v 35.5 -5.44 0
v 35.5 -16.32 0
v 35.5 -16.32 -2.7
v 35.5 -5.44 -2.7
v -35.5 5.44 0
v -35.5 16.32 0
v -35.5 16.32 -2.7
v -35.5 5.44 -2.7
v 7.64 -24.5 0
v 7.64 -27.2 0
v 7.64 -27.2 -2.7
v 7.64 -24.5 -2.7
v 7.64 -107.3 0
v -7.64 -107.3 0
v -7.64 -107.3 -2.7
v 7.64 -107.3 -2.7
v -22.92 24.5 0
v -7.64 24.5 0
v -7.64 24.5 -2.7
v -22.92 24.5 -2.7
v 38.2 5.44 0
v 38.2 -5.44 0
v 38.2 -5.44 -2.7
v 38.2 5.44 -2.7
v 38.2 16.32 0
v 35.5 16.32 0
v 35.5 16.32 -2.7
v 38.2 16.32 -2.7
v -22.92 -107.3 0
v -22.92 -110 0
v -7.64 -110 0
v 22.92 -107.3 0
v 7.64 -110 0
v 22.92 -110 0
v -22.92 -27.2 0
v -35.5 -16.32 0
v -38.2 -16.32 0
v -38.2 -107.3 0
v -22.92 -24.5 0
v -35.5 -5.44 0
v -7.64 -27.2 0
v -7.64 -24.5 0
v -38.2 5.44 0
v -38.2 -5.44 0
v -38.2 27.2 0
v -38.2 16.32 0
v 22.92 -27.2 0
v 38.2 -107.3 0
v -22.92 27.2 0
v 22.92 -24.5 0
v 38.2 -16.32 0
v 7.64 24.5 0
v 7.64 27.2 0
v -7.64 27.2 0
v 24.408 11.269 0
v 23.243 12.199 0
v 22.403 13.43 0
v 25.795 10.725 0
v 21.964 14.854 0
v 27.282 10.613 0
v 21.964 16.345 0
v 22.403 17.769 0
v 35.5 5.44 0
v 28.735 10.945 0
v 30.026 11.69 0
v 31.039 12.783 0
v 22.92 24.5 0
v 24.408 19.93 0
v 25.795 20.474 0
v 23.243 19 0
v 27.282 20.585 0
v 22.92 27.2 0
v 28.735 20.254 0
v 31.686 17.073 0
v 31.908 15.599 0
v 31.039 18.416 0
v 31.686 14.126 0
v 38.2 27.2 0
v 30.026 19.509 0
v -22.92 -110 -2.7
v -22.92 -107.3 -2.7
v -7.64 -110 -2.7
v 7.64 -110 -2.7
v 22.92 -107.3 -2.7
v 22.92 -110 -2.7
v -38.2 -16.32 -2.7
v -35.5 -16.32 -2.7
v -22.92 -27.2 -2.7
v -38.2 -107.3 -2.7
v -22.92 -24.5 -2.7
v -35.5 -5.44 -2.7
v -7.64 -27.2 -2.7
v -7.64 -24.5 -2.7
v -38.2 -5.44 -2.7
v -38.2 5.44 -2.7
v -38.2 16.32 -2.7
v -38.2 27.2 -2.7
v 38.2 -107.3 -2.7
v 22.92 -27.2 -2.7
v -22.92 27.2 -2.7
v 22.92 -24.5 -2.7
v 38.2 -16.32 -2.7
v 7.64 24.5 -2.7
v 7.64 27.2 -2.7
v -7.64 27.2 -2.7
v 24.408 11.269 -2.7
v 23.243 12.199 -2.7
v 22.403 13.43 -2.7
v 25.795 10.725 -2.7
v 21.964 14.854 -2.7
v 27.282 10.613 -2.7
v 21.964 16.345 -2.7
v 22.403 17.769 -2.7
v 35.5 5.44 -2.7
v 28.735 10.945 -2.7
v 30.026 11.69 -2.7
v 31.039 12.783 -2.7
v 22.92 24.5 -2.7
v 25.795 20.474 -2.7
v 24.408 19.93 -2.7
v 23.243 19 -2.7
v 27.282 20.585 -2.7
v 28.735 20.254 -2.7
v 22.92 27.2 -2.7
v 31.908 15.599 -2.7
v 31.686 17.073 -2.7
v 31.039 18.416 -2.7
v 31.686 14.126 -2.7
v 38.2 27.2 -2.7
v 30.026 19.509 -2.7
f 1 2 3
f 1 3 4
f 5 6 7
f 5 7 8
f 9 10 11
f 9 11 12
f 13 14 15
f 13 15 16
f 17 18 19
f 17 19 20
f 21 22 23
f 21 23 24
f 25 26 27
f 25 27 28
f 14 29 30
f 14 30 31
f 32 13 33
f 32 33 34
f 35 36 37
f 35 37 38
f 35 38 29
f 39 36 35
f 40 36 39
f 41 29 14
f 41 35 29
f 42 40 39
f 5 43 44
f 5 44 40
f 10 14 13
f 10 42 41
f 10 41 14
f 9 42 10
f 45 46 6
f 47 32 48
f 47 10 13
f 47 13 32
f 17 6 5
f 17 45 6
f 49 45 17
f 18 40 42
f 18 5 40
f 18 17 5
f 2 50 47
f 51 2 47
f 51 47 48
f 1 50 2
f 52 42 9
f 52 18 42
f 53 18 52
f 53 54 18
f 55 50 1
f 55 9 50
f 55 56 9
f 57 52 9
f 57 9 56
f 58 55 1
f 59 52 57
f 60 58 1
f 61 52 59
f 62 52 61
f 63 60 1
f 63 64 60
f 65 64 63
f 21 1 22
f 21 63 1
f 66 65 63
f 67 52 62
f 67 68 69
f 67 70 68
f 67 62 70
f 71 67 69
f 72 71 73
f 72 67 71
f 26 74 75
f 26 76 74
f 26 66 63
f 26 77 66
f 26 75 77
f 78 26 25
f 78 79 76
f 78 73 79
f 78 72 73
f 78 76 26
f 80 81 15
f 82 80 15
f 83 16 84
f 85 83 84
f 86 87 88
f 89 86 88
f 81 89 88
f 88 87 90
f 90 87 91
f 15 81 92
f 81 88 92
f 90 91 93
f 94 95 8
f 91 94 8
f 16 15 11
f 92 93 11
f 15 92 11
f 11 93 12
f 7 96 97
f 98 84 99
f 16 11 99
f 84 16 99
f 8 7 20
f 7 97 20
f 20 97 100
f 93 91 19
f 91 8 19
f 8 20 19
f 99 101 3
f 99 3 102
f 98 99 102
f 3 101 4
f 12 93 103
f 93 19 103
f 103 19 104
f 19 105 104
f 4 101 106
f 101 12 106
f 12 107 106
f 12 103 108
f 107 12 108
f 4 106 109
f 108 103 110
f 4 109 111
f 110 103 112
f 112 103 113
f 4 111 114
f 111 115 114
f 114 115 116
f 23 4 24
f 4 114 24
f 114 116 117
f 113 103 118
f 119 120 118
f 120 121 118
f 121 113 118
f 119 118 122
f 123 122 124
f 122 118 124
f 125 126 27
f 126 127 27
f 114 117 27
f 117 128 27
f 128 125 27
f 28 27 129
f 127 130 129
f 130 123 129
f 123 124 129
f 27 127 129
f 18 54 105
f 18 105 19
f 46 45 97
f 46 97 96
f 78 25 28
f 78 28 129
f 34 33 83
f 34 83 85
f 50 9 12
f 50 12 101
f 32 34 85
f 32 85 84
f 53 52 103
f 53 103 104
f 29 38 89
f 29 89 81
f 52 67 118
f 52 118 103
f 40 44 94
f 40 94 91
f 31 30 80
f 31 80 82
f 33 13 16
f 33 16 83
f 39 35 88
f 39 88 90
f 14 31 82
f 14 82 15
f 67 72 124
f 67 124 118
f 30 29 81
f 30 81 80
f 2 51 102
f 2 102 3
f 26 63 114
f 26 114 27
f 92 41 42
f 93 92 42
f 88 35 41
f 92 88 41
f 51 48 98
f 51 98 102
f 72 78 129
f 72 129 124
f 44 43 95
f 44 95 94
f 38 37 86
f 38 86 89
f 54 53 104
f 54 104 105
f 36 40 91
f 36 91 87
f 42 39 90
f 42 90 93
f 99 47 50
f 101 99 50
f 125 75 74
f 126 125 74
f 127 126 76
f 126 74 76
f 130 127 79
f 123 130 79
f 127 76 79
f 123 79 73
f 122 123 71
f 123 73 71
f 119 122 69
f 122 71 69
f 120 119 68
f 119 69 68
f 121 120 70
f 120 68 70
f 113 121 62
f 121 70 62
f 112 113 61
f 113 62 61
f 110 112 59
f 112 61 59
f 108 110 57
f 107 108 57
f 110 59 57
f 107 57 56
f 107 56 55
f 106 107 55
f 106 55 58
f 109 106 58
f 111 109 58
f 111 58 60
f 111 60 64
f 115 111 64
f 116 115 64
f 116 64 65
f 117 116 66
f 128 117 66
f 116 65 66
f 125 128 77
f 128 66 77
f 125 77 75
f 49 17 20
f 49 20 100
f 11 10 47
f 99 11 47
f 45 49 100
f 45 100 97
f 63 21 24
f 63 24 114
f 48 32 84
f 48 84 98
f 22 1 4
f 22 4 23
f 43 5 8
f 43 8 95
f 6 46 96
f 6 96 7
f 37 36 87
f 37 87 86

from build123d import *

# Parameters (mm, degrees)
SKETCH1_R           = 5
SKETCH1_W           = 15.28
SKETCH1_H           = 2.7
BOSS_EXTRUDE1_DEPTH = 2.7


with BuildPart() as part:
    # Sketch1 → Boss-Extrude1 (new body)
    with BuildSketch(Plane.XY):
        Polygon((38.2, 27.2), (22.92, 27.2), (22.92, 24.5), (7.64, 24.5), (7.64, 27.2), (-7.64, 27.2), (-7.64, 24.5), (-22.92, 24.5), (-22.92, 27.2), (-38.2, 27.2), (-38.2, 16.32), (-35.5, 16.32), (-35.5, 5.44), (-38.2, 5.44), (-38.2, -5.44), (-35.5, -5.44), (-35.5, -16.32), (-38.2, -16.32), (-38.2, -107.3), (-22.92, -107.3), (-22.92, -110), (-7.64, -110), (-7.64, -107.3), (7.64, -107.3), (7.64, -110), (22.92, -110), (22.92, -107.3), (38.2, -107.3), (38.2, -16.32), (35.5, -16.32), (35.5, -5.44), (38.2, -5.44), (38.2, 5.44), (35.5, 5.44), (35.5, 16.32), (38.2, 16.32), align=None)
        with Locations((26.908058417, 15.599455208)):
            Circle(SKETCH1_R, mode=Mode.SUBTRACT)
        with Locations((-15.28, -25.85)):
            Rectangle(SKETCH1_W, SKETCH1_H, mode=Mode.SUBTRACT)
        with Locations((15.28, -25.85)):
            Rectangle(SKETCH1_W, SKETCH1_H, mode=Mode.SUBTRACT)
    extrude(amount=-BOSS_EXTRUDE1_DEPTH)


solid = part.part
